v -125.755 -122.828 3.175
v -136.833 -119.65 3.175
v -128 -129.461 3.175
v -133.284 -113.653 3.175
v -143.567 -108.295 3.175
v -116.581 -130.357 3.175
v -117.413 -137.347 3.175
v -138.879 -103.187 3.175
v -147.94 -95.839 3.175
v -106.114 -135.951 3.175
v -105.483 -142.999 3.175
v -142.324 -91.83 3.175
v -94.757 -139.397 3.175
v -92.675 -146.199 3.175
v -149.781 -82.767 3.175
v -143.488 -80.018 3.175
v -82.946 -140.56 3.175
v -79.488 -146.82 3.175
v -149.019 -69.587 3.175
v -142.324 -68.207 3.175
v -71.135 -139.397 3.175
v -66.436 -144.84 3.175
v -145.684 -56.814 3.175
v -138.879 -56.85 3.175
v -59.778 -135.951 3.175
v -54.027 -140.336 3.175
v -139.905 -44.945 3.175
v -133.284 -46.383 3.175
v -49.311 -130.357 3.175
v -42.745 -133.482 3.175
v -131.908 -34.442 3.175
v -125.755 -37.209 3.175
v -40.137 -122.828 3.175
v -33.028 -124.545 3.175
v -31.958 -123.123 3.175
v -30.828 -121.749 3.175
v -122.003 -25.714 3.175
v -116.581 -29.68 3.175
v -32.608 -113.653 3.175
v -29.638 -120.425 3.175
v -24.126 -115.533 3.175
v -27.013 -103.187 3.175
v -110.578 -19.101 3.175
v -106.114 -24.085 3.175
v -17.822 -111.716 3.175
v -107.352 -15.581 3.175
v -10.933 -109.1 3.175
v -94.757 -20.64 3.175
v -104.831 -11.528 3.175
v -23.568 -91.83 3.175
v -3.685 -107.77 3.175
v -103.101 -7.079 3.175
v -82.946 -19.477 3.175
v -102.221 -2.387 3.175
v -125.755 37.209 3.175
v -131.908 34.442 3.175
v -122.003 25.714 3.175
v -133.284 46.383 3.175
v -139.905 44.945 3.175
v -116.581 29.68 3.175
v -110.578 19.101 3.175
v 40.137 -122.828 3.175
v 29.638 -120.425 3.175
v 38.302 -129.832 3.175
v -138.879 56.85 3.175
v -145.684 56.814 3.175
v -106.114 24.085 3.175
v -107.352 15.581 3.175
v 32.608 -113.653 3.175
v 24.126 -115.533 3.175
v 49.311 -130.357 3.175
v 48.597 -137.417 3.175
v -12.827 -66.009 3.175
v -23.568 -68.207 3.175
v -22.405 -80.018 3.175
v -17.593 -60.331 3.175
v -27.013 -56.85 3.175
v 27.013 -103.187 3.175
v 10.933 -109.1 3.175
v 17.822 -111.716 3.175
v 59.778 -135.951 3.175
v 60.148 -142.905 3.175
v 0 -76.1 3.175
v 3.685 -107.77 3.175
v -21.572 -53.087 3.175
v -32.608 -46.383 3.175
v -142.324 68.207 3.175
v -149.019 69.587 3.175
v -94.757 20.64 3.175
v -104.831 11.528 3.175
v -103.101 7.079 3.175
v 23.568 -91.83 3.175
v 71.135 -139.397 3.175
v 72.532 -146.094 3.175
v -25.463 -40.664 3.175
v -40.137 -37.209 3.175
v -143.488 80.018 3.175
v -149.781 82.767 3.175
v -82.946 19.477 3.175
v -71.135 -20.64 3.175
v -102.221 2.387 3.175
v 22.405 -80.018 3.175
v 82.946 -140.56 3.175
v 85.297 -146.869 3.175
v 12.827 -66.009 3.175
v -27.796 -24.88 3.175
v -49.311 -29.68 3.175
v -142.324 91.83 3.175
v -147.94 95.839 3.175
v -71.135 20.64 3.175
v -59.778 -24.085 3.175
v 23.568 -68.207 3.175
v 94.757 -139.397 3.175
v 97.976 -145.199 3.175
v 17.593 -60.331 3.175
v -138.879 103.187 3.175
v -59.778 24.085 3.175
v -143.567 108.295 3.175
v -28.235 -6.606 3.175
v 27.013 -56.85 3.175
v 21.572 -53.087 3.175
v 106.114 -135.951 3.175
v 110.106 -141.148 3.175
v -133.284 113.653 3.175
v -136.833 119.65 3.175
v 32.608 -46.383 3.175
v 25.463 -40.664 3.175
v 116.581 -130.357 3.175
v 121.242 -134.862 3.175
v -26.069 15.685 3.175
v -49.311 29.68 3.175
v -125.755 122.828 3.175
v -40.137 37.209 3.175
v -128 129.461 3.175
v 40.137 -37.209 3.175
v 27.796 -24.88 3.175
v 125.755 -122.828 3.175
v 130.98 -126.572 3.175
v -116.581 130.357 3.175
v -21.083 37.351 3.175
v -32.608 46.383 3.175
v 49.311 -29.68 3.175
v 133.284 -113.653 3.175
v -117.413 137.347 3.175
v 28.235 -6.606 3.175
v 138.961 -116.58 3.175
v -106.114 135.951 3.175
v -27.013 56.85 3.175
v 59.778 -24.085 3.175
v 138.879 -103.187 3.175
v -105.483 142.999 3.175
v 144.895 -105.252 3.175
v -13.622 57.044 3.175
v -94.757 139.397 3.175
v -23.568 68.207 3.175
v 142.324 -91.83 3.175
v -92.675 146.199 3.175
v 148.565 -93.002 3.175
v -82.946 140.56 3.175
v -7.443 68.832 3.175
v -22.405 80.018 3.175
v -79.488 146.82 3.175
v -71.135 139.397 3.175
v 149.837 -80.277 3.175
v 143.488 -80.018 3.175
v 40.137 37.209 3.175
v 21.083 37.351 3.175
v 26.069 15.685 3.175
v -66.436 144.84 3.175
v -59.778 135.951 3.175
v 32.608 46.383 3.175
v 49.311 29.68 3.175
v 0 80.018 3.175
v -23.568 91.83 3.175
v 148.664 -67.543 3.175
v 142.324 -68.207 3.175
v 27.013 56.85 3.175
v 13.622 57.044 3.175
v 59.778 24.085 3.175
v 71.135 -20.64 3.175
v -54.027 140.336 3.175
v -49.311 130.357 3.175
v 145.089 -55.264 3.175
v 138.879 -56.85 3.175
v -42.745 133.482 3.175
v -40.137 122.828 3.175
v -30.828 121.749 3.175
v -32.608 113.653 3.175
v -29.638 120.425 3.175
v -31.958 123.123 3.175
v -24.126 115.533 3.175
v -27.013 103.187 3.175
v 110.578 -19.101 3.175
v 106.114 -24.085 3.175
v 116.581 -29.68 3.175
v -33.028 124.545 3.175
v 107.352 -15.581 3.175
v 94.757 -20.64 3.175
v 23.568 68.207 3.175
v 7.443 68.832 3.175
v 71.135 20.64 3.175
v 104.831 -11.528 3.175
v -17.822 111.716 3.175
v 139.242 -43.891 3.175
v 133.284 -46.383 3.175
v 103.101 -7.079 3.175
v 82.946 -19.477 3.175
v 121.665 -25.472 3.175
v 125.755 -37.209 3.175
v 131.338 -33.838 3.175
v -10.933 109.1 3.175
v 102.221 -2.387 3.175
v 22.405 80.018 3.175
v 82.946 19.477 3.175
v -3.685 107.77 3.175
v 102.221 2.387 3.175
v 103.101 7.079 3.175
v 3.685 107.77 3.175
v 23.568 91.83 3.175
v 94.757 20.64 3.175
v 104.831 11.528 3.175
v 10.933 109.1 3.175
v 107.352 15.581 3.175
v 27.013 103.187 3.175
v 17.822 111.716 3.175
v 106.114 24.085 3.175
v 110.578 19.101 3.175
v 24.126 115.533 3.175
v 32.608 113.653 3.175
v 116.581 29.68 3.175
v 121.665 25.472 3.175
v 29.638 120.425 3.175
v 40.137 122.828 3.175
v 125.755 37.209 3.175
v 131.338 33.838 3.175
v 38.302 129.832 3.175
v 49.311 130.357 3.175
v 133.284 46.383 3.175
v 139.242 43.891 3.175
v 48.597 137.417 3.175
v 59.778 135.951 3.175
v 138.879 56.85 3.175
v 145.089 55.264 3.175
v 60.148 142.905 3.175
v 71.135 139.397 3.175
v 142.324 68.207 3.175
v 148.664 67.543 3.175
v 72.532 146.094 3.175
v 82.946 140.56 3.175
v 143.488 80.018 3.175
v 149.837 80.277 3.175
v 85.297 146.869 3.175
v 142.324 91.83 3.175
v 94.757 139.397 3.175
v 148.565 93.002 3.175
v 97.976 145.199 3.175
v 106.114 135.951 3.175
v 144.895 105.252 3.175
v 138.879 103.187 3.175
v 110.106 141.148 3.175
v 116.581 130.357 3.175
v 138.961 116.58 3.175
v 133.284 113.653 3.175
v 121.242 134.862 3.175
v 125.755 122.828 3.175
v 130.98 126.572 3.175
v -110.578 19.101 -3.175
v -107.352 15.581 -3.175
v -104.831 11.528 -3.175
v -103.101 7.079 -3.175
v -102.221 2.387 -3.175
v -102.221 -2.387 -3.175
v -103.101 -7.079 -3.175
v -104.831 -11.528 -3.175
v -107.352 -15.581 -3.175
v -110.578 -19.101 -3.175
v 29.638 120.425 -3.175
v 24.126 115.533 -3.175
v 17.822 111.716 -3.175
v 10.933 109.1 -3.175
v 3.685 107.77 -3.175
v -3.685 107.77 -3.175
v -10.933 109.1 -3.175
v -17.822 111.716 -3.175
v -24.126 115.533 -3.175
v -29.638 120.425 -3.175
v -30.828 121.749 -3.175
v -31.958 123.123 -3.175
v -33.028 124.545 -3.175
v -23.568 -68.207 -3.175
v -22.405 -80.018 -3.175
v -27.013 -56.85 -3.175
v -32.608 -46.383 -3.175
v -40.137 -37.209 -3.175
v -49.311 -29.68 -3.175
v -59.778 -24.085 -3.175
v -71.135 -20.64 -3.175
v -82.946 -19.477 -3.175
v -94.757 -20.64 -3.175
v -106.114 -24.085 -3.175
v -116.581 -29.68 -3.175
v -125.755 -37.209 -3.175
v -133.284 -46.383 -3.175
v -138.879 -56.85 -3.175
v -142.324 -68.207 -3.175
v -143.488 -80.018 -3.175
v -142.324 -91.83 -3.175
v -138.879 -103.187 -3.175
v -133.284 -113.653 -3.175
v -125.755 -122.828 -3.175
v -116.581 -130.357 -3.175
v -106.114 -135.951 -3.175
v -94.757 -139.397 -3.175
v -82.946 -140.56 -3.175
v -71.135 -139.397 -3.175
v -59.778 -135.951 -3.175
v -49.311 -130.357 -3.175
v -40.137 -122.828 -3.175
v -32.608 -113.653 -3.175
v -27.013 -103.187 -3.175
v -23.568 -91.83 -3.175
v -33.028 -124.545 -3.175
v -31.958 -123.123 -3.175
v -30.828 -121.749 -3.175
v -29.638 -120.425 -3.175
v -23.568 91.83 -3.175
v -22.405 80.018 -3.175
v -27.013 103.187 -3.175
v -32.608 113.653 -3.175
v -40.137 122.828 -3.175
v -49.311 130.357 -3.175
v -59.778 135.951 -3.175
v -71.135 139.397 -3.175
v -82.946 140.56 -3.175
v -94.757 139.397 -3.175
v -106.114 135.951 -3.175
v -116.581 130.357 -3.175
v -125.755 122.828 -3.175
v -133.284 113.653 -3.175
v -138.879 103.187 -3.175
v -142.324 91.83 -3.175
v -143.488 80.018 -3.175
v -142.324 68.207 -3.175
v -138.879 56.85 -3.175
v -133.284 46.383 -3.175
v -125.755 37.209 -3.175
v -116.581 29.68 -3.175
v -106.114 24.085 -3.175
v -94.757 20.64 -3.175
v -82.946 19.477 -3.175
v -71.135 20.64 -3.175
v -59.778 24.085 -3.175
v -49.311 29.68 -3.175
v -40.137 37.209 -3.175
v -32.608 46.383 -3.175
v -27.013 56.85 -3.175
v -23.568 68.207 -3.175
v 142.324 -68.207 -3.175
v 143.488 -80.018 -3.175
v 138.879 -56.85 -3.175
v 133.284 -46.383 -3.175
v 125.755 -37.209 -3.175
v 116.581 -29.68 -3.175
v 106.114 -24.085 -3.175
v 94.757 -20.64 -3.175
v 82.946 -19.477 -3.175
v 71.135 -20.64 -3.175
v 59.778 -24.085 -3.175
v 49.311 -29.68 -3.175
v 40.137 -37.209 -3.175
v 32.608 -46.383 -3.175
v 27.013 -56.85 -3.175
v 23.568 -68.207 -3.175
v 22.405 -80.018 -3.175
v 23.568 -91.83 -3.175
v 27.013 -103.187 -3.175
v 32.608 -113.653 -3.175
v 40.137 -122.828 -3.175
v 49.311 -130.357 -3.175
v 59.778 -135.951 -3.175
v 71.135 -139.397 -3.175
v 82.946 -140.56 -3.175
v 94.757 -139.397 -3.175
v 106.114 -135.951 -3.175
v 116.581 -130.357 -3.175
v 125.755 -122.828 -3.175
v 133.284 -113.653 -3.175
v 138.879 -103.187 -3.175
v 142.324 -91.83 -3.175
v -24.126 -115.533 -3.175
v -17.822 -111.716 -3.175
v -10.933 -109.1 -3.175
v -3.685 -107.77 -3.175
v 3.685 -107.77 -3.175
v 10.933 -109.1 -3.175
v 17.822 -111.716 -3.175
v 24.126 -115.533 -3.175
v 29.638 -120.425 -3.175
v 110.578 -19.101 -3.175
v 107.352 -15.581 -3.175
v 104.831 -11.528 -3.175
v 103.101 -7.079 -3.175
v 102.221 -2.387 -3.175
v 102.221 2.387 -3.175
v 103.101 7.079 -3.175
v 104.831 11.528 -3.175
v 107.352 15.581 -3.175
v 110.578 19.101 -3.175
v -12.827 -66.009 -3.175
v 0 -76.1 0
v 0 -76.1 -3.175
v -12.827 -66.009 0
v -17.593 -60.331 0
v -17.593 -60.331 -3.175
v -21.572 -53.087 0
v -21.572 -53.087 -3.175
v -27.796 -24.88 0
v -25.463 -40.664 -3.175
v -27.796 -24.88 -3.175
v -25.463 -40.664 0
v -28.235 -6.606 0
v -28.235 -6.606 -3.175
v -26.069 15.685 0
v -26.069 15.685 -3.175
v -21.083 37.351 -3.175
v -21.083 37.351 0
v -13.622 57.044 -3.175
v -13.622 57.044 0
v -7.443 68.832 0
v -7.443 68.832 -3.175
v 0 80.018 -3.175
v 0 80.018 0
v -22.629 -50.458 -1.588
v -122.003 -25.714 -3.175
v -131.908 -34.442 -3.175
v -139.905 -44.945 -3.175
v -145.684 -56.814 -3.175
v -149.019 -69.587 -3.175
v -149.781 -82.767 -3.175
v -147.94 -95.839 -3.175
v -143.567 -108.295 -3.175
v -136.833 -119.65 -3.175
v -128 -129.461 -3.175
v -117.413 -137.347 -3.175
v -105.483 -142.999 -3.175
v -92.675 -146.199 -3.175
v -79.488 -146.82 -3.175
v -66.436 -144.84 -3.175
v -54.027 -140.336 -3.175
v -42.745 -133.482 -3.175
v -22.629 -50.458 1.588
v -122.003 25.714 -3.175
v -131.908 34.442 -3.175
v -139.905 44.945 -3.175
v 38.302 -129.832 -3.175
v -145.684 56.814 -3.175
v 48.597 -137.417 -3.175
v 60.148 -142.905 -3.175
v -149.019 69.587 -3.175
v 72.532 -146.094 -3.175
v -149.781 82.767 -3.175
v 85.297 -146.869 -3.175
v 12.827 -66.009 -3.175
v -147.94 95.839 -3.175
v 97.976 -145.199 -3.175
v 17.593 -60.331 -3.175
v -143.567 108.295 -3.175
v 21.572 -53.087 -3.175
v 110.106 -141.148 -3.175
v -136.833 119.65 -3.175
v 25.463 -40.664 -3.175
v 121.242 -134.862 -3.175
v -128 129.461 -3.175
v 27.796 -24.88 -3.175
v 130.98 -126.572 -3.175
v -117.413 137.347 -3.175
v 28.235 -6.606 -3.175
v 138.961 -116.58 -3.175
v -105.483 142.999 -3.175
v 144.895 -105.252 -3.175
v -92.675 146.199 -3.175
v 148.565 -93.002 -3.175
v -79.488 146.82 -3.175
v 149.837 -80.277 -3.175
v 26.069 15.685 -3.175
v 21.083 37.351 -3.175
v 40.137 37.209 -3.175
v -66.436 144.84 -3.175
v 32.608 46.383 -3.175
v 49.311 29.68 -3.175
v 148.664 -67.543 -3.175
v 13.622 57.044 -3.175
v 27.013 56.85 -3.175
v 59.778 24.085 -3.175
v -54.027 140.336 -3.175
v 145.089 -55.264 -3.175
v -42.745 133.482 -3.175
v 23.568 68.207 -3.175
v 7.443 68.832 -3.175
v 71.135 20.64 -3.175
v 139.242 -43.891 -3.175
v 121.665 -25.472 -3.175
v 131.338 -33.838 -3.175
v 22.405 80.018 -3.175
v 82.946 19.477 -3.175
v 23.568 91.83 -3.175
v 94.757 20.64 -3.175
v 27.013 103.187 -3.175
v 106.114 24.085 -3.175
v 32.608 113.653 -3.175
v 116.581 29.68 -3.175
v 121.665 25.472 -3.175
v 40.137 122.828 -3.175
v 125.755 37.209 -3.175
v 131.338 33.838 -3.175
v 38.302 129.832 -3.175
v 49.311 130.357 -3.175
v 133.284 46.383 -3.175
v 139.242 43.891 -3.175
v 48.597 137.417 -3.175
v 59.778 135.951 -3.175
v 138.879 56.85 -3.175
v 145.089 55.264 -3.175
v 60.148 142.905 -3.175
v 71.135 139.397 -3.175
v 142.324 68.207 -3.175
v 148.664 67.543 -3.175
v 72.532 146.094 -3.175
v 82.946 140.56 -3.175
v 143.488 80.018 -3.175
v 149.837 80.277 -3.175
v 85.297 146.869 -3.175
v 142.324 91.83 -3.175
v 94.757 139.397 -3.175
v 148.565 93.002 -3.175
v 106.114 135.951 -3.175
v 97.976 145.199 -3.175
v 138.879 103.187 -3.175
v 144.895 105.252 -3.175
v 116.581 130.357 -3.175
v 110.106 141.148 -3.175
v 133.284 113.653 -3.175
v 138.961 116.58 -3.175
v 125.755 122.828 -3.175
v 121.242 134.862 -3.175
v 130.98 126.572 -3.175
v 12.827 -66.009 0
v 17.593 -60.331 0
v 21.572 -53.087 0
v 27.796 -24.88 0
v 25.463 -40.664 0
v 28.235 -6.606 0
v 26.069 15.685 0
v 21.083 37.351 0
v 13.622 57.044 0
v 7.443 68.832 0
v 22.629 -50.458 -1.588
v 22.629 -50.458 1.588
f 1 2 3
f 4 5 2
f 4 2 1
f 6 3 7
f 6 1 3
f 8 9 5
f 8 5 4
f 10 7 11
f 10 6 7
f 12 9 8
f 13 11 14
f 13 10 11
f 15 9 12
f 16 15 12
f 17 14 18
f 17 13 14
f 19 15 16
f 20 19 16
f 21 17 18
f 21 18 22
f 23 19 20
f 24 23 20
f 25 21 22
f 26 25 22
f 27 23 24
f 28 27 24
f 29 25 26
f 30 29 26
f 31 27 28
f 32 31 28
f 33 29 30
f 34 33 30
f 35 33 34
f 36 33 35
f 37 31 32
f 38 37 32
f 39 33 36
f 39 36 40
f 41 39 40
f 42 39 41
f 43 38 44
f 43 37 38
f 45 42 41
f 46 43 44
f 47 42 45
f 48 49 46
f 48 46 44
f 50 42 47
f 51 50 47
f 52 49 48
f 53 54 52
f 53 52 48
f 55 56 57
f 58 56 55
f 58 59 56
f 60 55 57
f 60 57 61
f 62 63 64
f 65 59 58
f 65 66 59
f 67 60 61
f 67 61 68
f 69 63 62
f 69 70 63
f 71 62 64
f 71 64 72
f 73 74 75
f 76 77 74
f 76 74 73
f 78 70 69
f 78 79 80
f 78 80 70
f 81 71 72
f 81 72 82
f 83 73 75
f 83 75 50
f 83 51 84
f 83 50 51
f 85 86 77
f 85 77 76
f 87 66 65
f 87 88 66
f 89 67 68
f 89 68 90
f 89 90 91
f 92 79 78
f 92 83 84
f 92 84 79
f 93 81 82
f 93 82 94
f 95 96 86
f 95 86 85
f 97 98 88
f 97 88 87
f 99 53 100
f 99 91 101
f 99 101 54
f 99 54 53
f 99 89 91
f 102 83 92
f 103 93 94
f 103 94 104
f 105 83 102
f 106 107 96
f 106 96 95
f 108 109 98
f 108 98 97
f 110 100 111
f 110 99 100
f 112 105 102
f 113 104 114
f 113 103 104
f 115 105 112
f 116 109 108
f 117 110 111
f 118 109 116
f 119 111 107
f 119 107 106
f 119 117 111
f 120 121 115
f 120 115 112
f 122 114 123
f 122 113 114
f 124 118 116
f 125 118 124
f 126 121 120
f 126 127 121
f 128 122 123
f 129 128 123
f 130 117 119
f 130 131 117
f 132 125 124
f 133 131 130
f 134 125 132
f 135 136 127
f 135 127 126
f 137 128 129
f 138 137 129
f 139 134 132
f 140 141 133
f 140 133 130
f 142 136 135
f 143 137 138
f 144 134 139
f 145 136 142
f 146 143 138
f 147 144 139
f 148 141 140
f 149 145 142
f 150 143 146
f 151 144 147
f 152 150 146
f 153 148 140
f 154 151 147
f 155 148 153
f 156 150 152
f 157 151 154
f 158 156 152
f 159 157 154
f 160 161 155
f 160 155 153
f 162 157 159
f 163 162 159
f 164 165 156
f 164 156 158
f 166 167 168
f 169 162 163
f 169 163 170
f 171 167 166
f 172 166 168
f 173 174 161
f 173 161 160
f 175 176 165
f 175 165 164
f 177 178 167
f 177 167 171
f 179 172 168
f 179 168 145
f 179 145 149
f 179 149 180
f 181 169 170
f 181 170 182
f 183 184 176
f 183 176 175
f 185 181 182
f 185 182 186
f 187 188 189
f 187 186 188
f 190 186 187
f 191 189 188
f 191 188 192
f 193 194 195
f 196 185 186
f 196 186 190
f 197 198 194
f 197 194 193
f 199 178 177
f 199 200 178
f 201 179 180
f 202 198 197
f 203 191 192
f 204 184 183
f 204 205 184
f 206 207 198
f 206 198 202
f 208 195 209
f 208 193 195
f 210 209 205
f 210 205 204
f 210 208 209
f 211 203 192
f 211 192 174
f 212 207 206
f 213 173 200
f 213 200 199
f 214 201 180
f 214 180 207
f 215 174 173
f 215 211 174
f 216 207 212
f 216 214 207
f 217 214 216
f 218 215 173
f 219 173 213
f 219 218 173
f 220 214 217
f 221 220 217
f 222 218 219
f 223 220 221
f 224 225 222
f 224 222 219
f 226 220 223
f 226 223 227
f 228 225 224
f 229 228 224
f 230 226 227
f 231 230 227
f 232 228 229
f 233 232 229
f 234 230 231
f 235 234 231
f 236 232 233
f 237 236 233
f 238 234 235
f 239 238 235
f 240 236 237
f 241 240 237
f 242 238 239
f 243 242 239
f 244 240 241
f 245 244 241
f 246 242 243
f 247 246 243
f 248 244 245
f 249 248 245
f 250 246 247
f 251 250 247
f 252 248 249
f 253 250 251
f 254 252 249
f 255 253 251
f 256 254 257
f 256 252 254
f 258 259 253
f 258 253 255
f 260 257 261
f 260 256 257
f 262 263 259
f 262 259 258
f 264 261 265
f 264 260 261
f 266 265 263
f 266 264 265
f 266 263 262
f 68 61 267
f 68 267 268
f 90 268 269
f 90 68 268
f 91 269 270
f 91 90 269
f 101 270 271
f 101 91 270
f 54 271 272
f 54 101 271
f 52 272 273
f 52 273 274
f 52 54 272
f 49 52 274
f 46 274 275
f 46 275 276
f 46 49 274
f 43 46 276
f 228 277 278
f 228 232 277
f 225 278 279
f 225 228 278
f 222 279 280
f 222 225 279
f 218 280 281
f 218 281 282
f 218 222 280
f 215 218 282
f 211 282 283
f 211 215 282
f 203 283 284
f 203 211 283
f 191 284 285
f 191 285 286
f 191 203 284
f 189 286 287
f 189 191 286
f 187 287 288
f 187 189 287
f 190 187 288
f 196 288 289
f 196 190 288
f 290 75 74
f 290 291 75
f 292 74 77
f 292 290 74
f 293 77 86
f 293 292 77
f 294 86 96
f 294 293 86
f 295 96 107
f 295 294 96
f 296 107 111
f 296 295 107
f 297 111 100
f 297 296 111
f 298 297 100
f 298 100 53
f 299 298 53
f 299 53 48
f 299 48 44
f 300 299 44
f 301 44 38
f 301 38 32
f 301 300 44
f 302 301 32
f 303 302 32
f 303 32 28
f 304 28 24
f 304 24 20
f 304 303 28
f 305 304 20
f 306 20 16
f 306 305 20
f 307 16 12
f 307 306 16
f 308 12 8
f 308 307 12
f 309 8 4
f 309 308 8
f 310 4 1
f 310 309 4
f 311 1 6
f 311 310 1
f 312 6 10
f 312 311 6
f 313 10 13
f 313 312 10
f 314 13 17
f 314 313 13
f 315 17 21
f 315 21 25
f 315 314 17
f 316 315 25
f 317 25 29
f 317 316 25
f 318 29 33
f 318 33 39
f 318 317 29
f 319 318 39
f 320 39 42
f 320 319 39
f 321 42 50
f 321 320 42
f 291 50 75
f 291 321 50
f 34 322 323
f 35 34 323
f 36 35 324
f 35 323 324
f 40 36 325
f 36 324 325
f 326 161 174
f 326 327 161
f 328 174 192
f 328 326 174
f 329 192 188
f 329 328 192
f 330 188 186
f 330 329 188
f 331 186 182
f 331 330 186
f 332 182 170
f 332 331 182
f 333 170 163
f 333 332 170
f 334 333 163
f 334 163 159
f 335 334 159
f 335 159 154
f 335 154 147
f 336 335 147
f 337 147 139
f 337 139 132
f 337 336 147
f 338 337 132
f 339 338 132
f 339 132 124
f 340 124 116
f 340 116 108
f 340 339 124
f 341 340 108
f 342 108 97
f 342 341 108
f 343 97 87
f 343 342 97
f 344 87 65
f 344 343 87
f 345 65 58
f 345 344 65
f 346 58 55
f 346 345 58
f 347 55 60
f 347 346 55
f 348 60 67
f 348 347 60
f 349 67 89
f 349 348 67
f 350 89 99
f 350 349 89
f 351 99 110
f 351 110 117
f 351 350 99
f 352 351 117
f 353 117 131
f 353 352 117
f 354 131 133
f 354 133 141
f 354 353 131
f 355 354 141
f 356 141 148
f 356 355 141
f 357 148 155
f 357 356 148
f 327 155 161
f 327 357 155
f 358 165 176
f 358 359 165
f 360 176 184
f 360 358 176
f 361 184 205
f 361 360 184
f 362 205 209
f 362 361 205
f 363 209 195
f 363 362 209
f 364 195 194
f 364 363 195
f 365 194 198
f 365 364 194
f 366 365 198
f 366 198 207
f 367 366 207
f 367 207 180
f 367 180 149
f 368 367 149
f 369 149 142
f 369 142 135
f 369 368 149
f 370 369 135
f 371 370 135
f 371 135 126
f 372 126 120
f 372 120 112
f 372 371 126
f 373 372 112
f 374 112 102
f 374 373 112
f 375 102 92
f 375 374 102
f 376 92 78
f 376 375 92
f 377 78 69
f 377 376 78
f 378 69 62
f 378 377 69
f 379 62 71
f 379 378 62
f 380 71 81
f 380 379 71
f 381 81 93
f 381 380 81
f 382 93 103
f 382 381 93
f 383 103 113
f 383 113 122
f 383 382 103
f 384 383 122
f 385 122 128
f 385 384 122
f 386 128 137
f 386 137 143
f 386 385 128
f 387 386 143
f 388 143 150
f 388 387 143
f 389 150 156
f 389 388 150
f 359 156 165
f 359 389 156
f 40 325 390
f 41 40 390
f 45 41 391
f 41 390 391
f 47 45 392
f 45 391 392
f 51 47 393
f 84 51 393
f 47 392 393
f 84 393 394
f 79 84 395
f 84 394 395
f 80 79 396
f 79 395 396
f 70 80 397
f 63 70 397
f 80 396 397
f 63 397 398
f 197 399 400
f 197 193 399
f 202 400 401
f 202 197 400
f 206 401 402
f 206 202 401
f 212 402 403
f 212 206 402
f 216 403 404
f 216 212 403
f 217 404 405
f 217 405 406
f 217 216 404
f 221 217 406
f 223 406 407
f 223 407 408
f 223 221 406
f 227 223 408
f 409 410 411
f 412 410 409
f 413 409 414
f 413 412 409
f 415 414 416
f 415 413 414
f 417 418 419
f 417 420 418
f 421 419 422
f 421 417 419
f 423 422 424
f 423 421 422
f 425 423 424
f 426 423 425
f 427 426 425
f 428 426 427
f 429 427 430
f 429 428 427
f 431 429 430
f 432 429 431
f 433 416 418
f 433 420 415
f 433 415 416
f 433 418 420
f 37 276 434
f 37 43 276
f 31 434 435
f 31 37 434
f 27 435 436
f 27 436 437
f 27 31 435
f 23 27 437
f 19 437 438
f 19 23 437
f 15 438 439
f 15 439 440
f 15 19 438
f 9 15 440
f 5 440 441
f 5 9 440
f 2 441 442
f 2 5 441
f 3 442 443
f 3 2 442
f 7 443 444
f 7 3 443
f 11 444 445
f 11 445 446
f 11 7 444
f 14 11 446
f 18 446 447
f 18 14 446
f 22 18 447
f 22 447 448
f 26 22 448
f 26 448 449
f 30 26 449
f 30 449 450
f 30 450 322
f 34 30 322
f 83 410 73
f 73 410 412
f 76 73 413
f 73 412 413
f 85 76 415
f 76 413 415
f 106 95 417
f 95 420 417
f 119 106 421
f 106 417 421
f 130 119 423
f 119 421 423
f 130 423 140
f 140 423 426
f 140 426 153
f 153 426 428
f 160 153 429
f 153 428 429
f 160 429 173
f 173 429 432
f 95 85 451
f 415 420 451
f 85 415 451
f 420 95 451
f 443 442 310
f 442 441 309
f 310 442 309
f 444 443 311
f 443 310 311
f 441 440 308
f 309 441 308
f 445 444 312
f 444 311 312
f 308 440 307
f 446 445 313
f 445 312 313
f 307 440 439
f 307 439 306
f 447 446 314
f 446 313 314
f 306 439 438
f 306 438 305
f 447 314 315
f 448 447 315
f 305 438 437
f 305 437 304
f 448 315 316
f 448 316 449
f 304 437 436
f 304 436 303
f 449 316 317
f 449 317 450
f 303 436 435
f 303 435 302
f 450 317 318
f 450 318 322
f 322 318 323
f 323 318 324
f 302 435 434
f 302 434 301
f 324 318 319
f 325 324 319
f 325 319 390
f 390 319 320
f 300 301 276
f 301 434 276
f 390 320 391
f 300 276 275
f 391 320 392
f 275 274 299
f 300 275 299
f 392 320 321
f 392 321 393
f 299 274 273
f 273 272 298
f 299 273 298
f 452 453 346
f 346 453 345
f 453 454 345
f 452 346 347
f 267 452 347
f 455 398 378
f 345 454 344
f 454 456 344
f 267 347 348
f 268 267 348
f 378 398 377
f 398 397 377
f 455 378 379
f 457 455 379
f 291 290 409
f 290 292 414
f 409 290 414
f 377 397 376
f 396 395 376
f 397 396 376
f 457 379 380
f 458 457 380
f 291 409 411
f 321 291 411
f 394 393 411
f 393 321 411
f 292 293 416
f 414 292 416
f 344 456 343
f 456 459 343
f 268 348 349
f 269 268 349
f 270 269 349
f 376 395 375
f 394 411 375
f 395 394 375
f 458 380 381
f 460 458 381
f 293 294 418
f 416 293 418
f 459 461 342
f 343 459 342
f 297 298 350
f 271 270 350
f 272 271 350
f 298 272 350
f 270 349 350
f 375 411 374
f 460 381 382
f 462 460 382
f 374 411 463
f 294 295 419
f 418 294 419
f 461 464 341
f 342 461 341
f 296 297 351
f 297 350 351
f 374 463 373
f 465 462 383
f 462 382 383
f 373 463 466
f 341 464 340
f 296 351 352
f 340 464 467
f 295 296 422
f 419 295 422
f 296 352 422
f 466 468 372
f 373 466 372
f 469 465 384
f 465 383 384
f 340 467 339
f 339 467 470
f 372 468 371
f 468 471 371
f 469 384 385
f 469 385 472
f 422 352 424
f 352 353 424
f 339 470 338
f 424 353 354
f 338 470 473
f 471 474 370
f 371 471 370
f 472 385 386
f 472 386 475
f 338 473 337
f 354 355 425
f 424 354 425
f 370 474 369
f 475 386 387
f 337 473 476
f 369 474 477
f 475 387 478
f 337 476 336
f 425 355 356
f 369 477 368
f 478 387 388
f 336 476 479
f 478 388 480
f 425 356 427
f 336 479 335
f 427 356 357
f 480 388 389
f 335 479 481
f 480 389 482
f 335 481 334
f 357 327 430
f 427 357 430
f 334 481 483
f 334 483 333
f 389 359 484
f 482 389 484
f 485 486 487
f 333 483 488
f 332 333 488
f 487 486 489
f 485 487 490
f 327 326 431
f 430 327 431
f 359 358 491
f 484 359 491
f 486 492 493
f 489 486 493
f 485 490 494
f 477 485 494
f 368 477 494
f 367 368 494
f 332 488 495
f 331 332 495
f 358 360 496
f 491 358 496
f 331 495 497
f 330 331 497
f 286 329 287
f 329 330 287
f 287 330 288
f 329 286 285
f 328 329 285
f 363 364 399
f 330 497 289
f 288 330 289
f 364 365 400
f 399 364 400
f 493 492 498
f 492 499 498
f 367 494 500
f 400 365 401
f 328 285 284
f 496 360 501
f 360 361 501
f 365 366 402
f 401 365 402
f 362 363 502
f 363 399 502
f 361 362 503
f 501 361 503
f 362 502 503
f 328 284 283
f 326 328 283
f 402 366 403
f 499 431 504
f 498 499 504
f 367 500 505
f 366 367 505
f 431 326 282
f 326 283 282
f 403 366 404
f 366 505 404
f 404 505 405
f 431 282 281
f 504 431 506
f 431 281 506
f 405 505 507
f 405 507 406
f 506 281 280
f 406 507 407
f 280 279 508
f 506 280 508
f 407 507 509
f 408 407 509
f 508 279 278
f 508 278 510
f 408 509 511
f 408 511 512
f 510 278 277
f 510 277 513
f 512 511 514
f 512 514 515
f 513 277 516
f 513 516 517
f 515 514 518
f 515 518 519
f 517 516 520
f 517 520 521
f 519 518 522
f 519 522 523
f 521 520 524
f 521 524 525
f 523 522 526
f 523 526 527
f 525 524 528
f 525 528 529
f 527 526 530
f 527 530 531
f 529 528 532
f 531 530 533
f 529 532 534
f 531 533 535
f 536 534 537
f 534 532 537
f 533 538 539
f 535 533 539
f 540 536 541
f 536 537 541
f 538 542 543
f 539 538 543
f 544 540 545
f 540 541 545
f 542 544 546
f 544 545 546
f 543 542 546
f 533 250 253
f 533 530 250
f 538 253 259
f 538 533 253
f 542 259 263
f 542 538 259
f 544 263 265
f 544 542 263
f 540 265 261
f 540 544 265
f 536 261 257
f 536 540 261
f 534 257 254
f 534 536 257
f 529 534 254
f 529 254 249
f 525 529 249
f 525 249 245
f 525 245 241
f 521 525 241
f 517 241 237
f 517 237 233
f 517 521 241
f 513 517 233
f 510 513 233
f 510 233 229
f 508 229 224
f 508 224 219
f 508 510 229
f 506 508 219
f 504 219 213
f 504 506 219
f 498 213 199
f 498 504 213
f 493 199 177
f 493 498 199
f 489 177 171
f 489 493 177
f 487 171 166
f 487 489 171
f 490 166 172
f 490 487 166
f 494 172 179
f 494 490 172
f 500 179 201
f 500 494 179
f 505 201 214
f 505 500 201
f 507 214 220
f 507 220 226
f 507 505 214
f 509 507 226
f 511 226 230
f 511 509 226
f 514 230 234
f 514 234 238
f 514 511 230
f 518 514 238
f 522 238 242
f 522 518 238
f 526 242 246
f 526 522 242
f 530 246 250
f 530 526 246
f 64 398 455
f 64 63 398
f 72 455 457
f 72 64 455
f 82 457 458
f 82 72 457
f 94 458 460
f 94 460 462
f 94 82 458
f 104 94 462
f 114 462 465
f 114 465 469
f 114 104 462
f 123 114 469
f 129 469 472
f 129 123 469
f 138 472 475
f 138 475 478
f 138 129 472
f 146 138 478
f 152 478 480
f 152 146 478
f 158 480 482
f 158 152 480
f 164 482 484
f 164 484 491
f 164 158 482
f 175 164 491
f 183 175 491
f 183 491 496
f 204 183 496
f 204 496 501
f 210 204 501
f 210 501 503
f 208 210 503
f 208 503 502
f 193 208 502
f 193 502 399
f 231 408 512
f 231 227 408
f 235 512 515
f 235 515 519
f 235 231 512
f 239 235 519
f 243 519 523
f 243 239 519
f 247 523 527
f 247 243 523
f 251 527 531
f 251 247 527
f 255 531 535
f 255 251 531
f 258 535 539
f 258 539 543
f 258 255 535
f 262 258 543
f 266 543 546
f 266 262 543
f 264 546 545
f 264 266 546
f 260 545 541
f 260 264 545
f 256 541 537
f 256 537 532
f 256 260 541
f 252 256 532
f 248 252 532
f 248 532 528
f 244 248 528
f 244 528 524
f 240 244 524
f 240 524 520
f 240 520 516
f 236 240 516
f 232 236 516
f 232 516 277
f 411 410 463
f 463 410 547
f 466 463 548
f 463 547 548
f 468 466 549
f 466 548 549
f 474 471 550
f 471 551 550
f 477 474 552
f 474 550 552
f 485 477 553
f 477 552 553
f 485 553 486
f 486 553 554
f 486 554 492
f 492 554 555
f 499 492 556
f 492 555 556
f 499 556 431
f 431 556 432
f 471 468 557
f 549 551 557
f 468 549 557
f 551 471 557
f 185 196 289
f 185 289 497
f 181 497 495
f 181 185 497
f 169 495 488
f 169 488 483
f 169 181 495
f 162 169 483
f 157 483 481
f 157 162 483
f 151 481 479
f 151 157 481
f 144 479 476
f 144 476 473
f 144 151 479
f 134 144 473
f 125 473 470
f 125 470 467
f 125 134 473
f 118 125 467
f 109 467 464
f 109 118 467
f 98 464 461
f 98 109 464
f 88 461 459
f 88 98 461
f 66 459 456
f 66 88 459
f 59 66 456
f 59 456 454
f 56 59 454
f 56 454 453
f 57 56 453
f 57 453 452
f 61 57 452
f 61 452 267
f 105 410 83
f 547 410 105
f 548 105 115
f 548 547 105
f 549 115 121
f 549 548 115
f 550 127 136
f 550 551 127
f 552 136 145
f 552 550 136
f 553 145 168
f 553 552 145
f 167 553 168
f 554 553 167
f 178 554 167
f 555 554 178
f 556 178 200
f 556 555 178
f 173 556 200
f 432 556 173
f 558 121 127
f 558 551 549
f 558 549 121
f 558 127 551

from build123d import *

# Parameters (mm, degrees)
F0_R     = 60.541459453
F2_DEPTH = 3.175


# Not quite as in the source:
# - the program builds the solid bodies; features that only make, move or delete a surface that nothing else refers to are left out


with BuildPart() as f2:
    # F0 (on Top) → F2 (new body, symmetric)
    with BuildSketch(Plane.XY):
        with BuildLine():
            ThreePointArc((29.63795994, 120.4253280383), (0, 107.6024649325), (-29.63795994, 120.4253280383))
            ThreePointArc((-29.63795994, 120.4253280383), (-31.4004725935, 122.4295872496), (-33.0277066154, 124.5451522517))
            ThreePointArc((-33.0277066154, 124.5451522517), (-136.833025163, 119.6500101861), (-110.5775391502, 19.1007385387))
            ThreePointArc((-110.5775391502, 19.1007385387), (-102.1103333636, 0), (-110.5775391502, -19.1007385387))
            ThreePointArc((-110.5775391502, -19.1007385387), (-136.833025163, -119.6500101861), (-33.0277066154, -124.5451522517))
            ThreePointArc((-33.0277066154, -124.5451522517), (-31.4004725935, -122.4295872496), (-29.63795994, -120.4253280383))
            ThreePointArc((-29.63795994, -120.4253280383), (0, -107.6024649325), (29.63795994, -120.4253280383))
            ThreePointArc((29.63795994, -120.4253280383), (135.2096998467, -121.7674331009), (110.5775391502, -19.1007385387))
            ThreePointArc((110.5775391502, -19.1007385387), (102.1103333636, 0), (110.5775391502, 19.1007385387))
            ThreePointArc((110.5775391502, 19.1007385387), (135.2096998467, 121.7674331009), (29.63795994, 120.4253280383))
        make_face()
        with Locations((-82.9460425302, -80.0184514167)):
            Circle(F0_R, mode=Mode.SUBTRACT)
        with Locations((82.9460425302, -80.0184514167)):
            Circle(F0_R, mode=Mode.SUBTRACT)
        with BuildLine():
            add(Edge.make_bspline(
                [(0, -76.0996581864), (9.5787021029, -69.2053000853), (33.1312215182, -54.3582389446), (31.8321399477, 37.4809793102), (0, 80.0184514167)],
                knots=[0, 0, 0, 0, 0.3369505381, 1, 1, 1, 1], degree=3))
            add(Edge.make_bspline(
                [(0, -76.0996581864), (-9.5787021029, -69.2053000853), (-33.1312215182, -54.3582389446), (-31.8321399477, 37.4809793102), (0, 80.0184514167)],
                knots=[0, 0, 0, 0, 0.3369505381, 1, 1, 1, 1], degree=3))
        make_face(mode=Mode.SUBTRACT)
        with Locations((-82.9460425302, 80.0184514167)):
            Circle(F0_R, mode=Mode.SUBTRACT)
        with Locations((82.9460425302, 80.0184514167)):
            Circle(F0_R, mode=Mode.SUBTRACT)
    extrude(amount=F2_DEPTH, both=True)


solid = f2.part
